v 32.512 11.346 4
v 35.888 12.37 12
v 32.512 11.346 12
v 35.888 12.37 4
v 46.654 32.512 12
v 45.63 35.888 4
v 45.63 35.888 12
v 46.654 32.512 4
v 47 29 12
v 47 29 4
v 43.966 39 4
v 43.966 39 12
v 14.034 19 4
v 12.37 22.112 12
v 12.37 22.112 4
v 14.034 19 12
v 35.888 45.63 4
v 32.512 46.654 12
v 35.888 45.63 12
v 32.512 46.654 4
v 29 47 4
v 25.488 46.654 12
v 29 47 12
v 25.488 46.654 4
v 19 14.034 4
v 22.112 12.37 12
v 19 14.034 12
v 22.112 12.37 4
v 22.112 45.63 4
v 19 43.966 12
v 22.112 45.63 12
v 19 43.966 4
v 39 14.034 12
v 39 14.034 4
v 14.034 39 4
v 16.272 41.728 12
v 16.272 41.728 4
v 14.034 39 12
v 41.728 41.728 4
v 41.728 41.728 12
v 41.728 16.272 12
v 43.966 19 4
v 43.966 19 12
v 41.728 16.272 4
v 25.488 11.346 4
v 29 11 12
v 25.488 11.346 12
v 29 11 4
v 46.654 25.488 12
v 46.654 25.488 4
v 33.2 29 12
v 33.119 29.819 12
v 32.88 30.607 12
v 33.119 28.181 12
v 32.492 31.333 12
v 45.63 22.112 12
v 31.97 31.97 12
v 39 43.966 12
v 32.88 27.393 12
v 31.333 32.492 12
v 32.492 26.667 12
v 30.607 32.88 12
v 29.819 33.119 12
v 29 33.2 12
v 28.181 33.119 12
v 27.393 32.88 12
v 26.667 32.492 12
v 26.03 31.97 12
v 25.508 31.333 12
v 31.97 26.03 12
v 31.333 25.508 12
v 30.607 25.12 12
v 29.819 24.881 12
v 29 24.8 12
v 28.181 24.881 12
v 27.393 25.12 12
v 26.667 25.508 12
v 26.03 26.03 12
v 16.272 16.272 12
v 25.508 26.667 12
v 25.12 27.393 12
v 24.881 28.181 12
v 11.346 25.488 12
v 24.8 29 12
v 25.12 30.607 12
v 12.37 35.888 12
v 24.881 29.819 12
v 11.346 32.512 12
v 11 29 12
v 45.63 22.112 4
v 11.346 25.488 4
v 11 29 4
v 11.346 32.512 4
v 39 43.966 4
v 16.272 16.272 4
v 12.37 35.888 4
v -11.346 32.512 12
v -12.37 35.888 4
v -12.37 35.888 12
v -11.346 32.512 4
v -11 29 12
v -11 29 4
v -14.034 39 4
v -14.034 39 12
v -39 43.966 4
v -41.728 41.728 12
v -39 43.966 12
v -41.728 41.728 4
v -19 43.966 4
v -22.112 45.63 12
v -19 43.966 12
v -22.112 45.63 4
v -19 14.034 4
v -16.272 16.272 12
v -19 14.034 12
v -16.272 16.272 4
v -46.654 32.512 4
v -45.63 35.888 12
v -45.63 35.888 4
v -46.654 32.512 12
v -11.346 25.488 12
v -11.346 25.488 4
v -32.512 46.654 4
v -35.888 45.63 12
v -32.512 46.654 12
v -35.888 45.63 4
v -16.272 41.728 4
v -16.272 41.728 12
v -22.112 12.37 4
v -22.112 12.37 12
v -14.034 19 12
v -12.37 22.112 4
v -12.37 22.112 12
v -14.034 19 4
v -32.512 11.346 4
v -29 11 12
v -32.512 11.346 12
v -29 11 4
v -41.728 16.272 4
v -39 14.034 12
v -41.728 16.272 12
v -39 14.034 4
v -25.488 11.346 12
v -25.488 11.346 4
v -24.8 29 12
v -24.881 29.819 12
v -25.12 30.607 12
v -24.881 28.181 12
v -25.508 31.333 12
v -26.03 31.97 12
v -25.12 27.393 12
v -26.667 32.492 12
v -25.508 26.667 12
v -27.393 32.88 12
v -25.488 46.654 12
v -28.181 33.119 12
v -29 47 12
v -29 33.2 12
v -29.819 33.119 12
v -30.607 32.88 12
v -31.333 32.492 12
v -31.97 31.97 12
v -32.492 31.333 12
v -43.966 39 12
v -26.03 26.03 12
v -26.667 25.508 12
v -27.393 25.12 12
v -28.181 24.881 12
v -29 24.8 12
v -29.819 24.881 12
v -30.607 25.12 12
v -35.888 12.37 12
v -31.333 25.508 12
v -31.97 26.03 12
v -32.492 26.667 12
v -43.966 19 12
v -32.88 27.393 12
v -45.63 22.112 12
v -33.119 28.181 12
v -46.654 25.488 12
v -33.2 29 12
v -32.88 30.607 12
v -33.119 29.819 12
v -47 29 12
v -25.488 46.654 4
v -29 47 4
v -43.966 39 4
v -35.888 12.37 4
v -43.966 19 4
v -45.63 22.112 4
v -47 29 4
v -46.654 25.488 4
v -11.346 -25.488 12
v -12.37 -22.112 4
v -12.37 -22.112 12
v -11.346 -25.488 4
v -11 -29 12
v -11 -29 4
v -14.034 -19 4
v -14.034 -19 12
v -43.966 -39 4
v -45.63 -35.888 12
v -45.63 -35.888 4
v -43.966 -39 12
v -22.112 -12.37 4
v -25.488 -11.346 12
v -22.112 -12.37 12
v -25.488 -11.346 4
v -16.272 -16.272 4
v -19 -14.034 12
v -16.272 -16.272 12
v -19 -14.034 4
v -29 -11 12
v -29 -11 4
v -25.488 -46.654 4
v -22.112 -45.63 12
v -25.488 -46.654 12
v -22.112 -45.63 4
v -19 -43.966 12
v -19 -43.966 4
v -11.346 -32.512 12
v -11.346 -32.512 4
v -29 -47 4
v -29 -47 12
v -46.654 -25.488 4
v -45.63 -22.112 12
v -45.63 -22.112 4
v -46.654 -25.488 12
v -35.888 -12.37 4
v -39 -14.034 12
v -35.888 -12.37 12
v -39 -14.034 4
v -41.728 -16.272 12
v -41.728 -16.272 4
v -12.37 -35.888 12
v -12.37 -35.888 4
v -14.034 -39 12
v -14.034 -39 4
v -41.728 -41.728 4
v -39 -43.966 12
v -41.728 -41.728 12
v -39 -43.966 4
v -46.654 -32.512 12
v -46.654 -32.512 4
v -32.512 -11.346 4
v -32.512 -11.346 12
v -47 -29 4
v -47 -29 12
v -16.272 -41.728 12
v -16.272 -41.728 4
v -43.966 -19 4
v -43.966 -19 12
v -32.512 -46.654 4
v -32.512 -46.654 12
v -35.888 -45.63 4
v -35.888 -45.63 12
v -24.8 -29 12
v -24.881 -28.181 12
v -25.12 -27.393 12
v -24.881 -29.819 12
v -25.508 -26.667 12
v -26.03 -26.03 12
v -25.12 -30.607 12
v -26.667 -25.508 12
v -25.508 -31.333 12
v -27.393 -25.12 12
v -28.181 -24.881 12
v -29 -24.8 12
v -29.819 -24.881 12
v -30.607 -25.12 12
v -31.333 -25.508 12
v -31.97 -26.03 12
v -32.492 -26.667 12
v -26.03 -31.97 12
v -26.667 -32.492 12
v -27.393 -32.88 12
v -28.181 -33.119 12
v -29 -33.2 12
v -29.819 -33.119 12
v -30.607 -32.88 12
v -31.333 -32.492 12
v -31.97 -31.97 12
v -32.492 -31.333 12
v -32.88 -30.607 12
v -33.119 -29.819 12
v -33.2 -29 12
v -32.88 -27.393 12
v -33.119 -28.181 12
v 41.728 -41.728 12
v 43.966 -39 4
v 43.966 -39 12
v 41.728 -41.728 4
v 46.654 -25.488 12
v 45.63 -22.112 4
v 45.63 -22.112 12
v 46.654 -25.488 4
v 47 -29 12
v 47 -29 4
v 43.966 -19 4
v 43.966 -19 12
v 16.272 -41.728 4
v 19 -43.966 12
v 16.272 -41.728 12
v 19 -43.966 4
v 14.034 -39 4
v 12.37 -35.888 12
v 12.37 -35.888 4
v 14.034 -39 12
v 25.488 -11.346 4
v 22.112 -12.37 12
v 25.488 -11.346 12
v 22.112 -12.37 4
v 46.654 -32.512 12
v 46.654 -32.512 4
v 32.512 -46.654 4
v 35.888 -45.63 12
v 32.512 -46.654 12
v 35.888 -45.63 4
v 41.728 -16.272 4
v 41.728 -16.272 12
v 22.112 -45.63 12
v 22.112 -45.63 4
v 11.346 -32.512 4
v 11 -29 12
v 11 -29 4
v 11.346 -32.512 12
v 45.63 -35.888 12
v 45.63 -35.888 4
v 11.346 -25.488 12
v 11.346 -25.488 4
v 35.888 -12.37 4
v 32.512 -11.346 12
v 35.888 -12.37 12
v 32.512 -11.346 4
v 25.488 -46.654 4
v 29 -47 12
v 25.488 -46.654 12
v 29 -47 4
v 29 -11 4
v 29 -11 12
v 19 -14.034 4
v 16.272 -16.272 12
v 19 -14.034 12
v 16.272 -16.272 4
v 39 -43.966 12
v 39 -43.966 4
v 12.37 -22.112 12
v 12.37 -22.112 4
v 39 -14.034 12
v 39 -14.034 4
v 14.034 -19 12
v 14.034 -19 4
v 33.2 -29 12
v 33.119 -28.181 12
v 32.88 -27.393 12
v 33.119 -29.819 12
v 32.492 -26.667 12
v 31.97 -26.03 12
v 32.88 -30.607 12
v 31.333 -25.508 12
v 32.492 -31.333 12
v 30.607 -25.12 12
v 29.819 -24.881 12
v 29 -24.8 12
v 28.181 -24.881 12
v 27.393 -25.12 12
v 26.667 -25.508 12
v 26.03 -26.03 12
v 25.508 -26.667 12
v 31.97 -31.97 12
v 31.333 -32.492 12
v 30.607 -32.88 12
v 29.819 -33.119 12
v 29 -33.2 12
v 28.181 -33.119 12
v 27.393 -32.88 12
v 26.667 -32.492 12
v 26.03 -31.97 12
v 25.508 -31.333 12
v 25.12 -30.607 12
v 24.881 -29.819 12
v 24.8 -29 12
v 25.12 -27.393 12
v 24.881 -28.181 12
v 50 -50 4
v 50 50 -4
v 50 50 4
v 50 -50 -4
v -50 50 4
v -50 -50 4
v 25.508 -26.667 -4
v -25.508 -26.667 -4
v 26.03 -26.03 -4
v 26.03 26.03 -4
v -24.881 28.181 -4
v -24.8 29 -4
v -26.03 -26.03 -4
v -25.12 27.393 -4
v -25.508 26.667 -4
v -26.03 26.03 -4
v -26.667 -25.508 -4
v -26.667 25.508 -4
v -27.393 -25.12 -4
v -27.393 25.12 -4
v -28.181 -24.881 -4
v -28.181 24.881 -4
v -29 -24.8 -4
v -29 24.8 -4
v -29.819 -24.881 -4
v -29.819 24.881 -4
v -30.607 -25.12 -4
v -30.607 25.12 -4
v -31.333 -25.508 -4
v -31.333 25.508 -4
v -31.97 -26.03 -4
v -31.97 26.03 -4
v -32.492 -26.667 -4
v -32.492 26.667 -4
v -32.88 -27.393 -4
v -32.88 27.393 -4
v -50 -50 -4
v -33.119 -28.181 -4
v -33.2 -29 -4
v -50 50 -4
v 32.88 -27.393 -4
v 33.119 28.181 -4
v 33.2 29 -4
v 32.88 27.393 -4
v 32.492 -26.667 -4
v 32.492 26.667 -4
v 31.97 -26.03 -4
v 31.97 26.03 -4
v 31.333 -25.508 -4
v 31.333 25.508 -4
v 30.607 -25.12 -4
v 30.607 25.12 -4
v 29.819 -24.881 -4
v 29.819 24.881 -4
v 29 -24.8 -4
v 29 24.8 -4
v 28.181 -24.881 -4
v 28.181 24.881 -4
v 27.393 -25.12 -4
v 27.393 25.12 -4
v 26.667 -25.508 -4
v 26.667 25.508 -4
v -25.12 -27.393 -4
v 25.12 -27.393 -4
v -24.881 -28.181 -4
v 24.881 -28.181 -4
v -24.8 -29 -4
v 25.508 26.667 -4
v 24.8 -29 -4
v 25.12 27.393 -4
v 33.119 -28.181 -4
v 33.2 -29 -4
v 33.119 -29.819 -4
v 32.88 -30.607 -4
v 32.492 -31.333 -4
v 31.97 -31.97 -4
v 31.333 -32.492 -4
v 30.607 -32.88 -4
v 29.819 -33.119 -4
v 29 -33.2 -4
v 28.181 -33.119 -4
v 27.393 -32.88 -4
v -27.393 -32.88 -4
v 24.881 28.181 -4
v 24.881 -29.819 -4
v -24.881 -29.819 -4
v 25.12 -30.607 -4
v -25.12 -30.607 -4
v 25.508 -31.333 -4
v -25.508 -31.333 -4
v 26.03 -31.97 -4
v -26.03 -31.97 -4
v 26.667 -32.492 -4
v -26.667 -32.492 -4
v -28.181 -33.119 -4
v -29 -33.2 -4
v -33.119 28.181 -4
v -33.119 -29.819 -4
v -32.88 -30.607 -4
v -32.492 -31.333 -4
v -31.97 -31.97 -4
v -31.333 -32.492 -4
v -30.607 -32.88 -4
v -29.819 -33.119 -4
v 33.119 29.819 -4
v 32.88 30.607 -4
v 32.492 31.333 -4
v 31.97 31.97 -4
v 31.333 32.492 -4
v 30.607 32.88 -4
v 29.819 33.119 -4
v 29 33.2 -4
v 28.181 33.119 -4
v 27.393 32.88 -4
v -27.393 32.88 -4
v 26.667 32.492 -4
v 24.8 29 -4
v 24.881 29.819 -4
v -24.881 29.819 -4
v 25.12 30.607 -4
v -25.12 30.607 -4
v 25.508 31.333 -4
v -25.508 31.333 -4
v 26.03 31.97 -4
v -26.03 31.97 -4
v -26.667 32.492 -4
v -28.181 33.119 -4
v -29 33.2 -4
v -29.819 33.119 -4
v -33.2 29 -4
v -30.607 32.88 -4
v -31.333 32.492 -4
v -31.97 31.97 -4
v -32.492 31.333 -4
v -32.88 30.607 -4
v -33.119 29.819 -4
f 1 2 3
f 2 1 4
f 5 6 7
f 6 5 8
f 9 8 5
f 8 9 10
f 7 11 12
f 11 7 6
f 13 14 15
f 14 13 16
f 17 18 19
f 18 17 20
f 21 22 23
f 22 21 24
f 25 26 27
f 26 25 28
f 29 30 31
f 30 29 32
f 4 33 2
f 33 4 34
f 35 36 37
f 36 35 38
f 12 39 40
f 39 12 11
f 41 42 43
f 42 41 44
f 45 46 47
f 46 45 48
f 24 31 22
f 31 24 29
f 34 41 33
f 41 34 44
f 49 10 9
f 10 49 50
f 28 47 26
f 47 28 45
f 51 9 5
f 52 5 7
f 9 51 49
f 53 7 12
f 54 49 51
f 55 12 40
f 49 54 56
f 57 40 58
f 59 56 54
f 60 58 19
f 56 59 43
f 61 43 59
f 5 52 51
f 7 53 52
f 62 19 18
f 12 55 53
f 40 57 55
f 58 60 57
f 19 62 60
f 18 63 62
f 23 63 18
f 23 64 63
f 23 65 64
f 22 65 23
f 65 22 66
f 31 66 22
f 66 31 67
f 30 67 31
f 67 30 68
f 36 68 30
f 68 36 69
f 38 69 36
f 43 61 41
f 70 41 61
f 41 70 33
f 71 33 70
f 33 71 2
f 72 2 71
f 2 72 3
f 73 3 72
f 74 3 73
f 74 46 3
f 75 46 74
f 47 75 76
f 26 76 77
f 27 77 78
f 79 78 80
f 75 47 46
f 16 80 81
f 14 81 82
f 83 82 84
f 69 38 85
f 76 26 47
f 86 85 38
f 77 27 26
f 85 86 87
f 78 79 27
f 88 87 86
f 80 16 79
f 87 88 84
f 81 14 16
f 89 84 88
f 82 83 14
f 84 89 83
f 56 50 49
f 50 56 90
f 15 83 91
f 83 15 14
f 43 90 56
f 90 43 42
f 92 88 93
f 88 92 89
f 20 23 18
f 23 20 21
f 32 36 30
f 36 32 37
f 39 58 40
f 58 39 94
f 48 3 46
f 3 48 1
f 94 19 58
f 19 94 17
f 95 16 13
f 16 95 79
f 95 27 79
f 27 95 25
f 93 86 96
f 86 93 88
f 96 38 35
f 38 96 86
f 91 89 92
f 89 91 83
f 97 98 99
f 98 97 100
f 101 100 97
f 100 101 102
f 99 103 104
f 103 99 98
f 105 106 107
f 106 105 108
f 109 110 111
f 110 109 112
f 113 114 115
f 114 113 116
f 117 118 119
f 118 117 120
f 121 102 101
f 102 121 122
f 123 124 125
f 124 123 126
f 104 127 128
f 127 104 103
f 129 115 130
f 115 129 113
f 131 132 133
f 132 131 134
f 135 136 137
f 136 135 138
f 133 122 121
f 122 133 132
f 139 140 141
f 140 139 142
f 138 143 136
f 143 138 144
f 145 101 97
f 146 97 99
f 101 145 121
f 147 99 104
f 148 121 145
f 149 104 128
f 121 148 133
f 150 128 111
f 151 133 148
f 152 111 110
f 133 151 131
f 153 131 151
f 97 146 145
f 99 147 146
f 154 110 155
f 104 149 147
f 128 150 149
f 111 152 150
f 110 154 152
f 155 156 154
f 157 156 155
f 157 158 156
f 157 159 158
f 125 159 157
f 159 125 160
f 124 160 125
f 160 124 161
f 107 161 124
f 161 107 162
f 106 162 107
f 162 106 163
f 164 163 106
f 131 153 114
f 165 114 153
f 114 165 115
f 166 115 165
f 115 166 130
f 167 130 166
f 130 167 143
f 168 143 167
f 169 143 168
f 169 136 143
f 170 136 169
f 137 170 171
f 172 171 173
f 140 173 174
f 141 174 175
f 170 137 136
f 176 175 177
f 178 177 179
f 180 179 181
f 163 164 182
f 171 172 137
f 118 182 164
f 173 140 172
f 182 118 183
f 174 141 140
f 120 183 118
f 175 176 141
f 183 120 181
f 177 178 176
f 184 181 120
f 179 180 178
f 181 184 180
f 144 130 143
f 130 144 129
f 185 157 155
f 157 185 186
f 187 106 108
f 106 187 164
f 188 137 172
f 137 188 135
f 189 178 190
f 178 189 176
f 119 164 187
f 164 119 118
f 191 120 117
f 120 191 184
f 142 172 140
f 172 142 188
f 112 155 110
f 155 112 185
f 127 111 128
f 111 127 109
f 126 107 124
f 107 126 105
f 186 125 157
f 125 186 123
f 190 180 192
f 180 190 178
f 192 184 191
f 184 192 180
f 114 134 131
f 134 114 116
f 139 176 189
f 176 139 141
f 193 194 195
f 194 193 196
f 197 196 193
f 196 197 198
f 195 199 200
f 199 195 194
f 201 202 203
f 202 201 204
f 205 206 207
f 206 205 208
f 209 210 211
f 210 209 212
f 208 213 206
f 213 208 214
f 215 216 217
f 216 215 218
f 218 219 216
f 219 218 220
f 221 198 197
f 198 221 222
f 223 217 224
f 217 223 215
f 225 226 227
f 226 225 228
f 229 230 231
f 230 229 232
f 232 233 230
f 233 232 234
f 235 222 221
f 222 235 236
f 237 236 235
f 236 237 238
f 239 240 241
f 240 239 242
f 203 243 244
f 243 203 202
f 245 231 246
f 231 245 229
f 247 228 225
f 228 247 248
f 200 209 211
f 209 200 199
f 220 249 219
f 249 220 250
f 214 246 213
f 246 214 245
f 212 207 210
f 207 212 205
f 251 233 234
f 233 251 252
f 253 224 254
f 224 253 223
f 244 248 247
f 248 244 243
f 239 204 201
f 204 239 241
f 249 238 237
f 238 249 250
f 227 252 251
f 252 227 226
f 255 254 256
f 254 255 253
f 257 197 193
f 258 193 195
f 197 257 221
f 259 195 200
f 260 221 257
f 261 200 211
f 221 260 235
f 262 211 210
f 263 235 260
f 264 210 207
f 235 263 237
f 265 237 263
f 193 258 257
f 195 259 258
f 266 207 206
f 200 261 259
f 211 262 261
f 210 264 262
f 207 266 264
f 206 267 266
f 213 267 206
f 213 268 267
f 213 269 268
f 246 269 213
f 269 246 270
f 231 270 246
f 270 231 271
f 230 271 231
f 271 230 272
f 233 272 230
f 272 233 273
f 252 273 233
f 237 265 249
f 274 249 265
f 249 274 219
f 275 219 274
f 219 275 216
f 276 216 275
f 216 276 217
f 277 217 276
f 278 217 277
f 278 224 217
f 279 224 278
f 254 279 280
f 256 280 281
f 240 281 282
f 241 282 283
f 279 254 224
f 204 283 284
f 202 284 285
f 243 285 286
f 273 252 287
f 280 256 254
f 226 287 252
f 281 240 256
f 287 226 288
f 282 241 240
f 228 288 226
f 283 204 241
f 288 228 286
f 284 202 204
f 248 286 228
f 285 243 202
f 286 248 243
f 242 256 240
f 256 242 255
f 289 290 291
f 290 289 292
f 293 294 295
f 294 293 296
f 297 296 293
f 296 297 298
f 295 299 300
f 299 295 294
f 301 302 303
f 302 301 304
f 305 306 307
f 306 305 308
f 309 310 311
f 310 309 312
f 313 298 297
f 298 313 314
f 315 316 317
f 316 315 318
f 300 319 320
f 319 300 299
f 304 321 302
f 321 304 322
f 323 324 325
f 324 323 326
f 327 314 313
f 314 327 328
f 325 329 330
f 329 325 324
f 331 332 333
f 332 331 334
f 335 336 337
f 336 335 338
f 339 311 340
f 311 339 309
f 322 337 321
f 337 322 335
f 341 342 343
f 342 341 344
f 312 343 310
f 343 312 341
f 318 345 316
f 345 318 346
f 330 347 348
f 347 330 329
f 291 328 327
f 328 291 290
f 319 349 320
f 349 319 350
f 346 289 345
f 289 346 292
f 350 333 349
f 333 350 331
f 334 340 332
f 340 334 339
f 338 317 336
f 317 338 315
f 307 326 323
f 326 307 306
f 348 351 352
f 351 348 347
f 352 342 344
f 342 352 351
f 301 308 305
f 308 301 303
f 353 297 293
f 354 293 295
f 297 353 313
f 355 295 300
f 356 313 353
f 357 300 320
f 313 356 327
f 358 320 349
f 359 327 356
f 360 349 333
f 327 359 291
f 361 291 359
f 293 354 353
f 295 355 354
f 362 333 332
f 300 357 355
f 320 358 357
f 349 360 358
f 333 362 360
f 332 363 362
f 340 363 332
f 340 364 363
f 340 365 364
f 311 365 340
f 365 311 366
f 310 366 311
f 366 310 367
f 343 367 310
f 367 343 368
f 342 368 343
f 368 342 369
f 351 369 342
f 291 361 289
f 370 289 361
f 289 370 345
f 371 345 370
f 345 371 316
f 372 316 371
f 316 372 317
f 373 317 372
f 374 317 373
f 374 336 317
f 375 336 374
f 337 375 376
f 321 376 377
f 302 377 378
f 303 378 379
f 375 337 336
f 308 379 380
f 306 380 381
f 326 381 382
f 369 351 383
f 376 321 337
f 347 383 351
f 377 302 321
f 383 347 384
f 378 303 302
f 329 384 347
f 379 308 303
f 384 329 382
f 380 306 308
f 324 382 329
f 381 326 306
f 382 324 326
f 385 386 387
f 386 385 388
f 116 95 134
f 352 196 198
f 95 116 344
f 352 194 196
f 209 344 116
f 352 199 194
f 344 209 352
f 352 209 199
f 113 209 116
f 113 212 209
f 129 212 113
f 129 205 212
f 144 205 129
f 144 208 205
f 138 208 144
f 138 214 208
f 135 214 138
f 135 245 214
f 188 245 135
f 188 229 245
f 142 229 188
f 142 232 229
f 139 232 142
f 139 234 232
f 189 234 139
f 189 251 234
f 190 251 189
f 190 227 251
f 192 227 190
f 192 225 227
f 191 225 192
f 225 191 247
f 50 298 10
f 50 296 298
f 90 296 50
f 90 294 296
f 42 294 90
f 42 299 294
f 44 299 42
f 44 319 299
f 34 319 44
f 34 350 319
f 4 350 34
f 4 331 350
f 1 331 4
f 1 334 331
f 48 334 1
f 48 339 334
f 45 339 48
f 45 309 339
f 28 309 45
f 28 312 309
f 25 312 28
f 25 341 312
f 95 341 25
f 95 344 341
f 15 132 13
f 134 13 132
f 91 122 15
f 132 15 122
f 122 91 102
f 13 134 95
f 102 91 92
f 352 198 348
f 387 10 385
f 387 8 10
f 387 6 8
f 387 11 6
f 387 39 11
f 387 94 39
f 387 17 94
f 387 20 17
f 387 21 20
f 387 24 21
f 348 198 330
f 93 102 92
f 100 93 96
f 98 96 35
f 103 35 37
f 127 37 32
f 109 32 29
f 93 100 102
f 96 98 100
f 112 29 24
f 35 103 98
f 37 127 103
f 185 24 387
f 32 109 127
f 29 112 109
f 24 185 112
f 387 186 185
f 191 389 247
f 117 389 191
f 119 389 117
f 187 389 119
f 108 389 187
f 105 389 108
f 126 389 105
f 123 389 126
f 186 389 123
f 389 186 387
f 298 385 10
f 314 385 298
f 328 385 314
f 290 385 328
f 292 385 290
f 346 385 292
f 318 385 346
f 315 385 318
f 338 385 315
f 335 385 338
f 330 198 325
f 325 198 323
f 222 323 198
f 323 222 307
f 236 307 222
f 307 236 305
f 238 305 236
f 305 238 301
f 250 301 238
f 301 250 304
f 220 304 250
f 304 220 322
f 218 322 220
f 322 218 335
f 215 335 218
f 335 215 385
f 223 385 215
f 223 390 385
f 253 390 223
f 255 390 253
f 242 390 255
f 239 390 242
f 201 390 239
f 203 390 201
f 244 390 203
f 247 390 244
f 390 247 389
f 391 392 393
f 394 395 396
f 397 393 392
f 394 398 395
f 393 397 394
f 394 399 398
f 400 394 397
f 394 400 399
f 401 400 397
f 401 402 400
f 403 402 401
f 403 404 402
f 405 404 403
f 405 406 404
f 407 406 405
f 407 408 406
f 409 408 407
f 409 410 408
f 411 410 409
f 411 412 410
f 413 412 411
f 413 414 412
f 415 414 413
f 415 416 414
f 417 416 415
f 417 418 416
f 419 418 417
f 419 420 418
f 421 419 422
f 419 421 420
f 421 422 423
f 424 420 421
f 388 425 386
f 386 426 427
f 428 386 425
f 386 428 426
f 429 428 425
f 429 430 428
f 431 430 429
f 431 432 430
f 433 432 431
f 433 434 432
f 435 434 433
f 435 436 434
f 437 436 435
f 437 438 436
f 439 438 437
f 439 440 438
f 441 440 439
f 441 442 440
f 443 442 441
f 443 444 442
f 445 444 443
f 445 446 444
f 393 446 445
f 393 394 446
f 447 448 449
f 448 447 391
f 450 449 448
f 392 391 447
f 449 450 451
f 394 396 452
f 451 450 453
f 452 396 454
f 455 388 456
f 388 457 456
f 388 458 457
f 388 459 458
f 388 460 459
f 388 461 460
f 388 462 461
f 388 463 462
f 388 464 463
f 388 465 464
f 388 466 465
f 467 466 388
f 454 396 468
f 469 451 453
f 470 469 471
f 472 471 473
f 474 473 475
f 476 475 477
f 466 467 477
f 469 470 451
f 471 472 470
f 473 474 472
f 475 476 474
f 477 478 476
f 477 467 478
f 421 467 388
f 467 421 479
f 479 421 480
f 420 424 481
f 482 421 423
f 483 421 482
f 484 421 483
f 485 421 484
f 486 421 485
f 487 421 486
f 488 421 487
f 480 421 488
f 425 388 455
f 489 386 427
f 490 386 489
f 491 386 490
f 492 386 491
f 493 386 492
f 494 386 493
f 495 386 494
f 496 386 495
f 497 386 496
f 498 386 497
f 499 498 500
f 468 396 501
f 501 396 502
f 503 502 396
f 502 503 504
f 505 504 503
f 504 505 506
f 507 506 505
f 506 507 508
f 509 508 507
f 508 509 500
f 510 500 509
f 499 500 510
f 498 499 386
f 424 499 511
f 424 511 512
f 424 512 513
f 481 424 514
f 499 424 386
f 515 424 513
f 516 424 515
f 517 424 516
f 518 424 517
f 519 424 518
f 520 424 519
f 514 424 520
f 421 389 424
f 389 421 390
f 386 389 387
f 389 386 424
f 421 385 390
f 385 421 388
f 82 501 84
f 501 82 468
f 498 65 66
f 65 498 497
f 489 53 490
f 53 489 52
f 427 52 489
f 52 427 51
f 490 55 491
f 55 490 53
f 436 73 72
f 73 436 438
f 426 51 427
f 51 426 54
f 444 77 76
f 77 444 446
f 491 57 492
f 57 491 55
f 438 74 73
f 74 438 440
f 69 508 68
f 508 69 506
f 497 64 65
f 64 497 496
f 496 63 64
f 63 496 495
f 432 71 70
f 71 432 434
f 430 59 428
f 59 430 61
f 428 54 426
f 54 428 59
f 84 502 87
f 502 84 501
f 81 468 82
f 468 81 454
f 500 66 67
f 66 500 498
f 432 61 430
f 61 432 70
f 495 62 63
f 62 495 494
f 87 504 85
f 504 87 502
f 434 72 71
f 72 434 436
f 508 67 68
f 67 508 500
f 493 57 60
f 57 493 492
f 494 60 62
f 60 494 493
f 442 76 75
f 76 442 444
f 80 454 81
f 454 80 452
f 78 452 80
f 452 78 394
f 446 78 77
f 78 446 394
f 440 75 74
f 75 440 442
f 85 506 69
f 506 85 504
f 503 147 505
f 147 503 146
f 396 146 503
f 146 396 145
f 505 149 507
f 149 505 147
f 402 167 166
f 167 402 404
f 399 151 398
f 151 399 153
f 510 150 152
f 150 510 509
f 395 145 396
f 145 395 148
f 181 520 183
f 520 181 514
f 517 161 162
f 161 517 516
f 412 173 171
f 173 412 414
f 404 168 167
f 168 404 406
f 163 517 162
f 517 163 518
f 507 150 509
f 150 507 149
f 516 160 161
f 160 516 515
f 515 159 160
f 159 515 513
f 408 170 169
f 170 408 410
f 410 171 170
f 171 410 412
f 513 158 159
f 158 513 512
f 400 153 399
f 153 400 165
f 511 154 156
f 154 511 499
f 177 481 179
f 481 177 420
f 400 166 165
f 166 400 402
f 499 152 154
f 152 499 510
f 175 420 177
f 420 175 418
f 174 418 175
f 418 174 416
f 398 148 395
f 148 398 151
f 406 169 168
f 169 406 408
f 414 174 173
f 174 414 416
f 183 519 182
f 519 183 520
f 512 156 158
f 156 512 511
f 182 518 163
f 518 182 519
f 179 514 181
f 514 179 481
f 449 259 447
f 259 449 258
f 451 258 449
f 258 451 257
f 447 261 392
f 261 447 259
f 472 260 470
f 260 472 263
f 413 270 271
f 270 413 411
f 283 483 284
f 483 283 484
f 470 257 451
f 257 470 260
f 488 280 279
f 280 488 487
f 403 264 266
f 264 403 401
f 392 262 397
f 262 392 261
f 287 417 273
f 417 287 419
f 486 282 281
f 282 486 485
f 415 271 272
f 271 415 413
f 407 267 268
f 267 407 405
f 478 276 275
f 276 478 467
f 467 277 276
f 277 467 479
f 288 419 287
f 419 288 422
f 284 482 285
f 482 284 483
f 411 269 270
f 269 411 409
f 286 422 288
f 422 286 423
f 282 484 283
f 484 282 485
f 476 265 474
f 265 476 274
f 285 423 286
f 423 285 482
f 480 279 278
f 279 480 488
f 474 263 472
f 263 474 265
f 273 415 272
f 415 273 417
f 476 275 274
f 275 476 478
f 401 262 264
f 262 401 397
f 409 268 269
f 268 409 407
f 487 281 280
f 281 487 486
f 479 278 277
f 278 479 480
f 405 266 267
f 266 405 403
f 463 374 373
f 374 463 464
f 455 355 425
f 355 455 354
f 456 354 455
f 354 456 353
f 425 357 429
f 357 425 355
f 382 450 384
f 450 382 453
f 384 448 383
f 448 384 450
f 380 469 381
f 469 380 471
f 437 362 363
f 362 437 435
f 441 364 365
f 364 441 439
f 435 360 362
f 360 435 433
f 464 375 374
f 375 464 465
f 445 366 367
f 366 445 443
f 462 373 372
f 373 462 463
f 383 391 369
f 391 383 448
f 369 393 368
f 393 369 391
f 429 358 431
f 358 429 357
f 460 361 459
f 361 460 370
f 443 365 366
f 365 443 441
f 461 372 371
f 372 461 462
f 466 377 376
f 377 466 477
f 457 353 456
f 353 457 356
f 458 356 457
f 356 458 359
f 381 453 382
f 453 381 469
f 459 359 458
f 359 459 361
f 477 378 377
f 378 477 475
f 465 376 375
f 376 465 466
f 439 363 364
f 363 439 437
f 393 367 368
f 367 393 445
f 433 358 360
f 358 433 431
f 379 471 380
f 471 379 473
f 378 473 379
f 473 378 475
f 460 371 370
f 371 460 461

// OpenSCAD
$fn = 32;

// ----------------------------------------------------------------------
// Anchor pads 100 x 100 x 16
// four corner bosses with anchor holes
// ----------------------------------------------------------------------

// --- parameters (mm) ---
plate = [100, 100, 8];  // base plate size (x, y, z)
pads = 4;               // boss count, one per corner
edge = 21;              // boss centre offset from the plate edge
boss_d = 36;            // boss diameter
boss_h = 8;             // boss height above the base plate
hole_d = 8.4;           // hole diameter

// --- derived feature positions (mm) ---
height = plate[2] + boss_h;      // = 16   overall height of the part
corner_x = plate[0] / 2 - edge;  // = 29   boss centre X
corner_y = plate[1] / 2 - edge;  // = 29   boss centre Y
feature_centers = [
  [corner_x, corner_y],
  [-corner_x, corner_y],
  [-corner_x, -corner_y],
  [corner_x, -corner_y]
];   // boss centres, anchor holes are drilled there

// base plate, four bosses standing on it, anchor holes all the way through
difference() {
  union() {
    cube(plate, center = true);
    for (centre = feature_centers)
      translate([centre[0], centre[1], plate[2] / 2 - 1])
        cylinder(d = boss_d, h = boss_h + 1);
  }
  for (centre = feature_centers)
    translate([centre[0], centre[1], -height])
      cylinder(d = hole_d, h = 2 * height + 2);  // through boss and plate
}
